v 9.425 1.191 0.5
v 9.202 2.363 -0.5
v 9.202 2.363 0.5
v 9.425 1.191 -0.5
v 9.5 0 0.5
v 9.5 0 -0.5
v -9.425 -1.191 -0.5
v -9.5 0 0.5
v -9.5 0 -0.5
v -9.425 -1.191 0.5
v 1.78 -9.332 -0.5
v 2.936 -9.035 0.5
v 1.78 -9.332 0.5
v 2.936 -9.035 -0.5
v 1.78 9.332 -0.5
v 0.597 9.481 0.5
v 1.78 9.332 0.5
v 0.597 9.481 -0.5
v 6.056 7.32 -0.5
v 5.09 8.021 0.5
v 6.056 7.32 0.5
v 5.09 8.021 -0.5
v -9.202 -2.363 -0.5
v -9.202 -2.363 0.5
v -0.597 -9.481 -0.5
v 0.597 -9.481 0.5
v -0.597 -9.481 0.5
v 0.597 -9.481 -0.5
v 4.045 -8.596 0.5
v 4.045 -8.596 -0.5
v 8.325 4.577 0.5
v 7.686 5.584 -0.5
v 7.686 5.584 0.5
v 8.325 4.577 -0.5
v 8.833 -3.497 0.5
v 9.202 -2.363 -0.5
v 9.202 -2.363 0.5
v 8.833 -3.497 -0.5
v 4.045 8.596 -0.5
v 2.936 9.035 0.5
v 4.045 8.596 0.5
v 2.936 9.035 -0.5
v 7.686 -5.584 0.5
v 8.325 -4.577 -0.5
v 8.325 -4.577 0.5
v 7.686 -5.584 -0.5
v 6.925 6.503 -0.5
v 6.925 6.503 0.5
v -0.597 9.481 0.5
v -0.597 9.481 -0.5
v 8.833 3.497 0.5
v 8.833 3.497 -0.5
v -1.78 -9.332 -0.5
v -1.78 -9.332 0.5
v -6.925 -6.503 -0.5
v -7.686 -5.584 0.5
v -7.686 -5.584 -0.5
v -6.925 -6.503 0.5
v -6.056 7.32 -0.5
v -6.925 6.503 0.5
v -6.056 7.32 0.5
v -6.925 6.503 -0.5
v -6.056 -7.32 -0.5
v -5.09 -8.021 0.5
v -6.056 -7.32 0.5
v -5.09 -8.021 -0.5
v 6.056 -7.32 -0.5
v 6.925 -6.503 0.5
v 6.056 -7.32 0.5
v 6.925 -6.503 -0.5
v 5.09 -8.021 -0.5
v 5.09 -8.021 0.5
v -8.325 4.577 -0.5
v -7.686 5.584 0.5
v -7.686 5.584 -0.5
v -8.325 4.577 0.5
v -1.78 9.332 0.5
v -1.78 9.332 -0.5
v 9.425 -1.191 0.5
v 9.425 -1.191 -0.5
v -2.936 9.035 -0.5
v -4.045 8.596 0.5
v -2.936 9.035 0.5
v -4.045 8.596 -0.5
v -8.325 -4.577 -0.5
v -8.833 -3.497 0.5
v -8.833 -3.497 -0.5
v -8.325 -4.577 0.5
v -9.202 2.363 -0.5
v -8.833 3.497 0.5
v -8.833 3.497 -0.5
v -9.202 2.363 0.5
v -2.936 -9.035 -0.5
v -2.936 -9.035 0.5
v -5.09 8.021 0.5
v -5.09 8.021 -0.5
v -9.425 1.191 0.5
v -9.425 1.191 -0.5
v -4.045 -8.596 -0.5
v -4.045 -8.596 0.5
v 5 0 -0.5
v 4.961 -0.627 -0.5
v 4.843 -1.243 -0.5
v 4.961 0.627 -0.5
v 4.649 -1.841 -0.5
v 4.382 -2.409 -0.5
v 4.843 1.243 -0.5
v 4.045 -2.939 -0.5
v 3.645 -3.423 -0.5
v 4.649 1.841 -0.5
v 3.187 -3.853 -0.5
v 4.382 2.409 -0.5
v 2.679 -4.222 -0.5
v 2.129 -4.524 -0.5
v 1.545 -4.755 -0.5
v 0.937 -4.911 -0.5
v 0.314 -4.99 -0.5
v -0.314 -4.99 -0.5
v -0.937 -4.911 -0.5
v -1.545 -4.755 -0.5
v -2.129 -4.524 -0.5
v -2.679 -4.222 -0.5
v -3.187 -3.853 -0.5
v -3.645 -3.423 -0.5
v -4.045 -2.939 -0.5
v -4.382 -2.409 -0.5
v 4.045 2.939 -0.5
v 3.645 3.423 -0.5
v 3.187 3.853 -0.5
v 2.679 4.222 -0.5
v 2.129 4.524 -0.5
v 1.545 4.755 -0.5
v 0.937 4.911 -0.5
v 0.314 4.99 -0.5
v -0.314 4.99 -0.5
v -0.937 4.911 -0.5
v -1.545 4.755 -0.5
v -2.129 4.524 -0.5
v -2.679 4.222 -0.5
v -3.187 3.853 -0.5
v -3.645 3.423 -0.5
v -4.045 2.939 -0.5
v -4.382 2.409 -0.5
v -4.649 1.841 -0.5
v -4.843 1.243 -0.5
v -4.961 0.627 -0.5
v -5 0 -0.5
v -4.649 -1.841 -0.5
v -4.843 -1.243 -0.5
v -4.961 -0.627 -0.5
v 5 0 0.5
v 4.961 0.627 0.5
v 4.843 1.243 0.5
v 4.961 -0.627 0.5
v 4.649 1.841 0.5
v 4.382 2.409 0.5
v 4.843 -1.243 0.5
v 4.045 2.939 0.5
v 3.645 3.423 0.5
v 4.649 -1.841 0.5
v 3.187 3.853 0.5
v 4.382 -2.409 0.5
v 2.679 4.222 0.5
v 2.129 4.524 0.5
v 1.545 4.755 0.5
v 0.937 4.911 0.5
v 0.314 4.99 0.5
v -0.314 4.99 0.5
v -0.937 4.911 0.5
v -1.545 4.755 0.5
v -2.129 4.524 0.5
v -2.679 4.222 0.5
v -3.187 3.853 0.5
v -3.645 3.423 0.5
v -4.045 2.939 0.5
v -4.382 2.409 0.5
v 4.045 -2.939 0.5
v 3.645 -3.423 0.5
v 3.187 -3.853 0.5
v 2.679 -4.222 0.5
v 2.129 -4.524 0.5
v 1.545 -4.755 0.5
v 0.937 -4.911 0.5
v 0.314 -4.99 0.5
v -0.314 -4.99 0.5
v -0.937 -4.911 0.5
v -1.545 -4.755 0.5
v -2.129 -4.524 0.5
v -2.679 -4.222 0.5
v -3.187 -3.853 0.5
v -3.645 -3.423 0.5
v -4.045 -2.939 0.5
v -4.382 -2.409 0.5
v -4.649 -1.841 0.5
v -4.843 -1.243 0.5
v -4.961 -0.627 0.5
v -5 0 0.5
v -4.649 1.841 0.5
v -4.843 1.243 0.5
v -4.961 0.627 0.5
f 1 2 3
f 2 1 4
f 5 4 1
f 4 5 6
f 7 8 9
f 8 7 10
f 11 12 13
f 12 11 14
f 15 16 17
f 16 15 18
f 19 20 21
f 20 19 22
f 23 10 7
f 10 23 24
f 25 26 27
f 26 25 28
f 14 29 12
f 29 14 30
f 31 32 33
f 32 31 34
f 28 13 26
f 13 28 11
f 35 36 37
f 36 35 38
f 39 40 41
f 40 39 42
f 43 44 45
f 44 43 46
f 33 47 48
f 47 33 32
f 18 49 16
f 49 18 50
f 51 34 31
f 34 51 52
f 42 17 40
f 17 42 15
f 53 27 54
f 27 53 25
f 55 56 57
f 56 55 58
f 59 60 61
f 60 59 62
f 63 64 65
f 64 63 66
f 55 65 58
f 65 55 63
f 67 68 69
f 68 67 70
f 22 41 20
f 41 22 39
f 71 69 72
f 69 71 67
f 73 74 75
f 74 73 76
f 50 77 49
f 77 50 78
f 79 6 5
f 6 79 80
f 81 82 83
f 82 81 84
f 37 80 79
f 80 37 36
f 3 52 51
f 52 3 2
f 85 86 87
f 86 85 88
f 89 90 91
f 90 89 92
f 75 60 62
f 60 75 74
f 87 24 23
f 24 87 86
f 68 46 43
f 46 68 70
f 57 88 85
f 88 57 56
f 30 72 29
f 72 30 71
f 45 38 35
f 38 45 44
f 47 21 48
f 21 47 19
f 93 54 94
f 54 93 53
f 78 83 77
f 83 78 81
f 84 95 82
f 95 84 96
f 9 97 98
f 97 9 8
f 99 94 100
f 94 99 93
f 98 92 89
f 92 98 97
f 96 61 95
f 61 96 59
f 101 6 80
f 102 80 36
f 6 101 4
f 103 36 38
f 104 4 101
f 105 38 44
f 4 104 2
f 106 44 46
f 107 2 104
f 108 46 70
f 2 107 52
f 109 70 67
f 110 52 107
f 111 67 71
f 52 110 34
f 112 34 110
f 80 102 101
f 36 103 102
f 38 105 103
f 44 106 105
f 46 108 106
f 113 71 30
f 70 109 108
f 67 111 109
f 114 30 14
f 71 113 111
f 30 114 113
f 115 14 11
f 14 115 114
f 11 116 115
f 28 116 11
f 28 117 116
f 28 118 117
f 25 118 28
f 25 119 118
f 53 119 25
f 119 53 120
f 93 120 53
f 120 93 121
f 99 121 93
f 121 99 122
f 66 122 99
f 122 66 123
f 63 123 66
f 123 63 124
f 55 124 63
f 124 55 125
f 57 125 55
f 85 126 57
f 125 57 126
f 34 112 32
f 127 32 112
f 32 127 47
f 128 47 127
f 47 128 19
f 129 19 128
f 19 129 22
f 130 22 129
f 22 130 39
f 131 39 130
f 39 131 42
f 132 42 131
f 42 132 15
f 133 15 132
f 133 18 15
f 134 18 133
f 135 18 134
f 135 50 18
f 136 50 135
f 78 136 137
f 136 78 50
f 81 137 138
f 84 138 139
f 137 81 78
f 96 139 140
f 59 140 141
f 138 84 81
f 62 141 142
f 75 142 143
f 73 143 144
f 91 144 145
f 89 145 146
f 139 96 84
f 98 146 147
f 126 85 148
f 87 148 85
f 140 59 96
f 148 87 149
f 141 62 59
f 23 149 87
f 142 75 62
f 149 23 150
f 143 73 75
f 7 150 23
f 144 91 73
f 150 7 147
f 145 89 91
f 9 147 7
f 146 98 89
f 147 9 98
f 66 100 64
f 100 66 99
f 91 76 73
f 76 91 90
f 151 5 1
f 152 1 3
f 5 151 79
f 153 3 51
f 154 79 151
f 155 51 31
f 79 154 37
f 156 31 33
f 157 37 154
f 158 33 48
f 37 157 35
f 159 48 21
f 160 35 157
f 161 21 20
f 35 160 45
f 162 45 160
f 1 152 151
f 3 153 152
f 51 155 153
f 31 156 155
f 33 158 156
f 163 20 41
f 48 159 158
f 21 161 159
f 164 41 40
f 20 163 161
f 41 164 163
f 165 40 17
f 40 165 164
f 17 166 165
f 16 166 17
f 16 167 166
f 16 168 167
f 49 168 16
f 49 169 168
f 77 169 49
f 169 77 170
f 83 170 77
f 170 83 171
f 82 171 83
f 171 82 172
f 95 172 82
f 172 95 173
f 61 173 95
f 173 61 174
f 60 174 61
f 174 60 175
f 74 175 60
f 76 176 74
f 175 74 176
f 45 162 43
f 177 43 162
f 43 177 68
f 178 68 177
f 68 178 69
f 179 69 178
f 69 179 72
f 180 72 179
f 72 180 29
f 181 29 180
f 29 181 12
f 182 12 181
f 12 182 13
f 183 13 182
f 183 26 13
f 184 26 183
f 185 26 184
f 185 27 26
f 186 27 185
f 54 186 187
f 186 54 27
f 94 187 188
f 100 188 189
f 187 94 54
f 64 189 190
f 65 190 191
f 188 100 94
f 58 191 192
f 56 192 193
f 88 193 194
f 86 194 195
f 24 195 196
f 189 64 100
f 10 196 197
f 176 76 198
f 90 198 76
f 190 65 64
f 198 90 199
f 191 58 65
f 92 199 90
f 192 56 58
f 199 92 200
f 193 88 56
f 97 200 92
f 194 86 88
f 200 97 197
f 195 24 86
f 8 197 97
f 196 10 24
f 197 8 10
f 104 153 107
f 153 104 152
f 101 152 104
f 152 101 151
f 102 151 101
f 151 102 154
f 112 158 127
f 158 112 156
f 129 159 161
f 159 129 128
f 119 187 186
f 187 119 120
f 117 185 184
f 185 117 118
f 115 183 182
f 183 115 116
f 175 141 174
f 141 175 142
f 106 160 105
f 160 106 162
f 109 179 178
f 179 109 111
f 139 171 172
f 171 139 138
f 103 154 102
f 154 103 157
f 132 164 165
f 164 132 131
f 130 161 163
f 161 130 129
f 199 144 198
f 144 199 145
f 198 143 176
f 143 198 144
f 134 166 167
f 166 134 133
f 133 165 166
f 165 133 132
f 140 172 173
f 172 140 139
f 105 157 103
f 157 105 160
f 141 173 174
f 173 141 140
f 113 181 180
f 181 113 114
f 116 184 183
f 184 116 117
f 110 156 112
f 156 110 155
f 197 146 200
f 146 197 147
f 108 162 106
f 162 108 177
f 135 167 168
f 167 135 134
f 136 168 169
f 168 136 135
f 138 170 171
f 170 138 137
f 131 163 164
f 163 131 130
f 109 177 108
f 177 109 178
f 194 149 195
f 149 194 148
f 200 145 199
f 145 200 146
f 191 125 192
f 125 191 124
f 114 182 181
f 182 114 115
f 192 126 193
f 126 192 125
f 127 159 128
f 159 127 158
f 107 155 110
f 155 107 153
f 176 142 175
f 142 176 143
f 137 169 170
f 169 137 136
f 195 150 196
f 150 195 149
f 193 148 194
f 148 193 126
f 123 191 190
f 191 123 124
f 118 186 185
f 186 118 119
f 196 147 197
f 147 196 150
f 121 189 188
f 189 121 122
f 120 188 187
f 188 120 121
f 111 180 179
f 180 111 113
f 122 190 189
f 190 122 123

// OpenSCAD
$fn = 50;


difference() {
	union() {
		translate(v = [0, 0, -0.5000000000]) {
			cylinder(h = 1, r = 9.5000000000);
		}
	}
	union() {
		translate(v = [0, 0, -100.0000000000]) {
			cylinder(h = 200, r = 5.0000000000);
		}
	}
}
